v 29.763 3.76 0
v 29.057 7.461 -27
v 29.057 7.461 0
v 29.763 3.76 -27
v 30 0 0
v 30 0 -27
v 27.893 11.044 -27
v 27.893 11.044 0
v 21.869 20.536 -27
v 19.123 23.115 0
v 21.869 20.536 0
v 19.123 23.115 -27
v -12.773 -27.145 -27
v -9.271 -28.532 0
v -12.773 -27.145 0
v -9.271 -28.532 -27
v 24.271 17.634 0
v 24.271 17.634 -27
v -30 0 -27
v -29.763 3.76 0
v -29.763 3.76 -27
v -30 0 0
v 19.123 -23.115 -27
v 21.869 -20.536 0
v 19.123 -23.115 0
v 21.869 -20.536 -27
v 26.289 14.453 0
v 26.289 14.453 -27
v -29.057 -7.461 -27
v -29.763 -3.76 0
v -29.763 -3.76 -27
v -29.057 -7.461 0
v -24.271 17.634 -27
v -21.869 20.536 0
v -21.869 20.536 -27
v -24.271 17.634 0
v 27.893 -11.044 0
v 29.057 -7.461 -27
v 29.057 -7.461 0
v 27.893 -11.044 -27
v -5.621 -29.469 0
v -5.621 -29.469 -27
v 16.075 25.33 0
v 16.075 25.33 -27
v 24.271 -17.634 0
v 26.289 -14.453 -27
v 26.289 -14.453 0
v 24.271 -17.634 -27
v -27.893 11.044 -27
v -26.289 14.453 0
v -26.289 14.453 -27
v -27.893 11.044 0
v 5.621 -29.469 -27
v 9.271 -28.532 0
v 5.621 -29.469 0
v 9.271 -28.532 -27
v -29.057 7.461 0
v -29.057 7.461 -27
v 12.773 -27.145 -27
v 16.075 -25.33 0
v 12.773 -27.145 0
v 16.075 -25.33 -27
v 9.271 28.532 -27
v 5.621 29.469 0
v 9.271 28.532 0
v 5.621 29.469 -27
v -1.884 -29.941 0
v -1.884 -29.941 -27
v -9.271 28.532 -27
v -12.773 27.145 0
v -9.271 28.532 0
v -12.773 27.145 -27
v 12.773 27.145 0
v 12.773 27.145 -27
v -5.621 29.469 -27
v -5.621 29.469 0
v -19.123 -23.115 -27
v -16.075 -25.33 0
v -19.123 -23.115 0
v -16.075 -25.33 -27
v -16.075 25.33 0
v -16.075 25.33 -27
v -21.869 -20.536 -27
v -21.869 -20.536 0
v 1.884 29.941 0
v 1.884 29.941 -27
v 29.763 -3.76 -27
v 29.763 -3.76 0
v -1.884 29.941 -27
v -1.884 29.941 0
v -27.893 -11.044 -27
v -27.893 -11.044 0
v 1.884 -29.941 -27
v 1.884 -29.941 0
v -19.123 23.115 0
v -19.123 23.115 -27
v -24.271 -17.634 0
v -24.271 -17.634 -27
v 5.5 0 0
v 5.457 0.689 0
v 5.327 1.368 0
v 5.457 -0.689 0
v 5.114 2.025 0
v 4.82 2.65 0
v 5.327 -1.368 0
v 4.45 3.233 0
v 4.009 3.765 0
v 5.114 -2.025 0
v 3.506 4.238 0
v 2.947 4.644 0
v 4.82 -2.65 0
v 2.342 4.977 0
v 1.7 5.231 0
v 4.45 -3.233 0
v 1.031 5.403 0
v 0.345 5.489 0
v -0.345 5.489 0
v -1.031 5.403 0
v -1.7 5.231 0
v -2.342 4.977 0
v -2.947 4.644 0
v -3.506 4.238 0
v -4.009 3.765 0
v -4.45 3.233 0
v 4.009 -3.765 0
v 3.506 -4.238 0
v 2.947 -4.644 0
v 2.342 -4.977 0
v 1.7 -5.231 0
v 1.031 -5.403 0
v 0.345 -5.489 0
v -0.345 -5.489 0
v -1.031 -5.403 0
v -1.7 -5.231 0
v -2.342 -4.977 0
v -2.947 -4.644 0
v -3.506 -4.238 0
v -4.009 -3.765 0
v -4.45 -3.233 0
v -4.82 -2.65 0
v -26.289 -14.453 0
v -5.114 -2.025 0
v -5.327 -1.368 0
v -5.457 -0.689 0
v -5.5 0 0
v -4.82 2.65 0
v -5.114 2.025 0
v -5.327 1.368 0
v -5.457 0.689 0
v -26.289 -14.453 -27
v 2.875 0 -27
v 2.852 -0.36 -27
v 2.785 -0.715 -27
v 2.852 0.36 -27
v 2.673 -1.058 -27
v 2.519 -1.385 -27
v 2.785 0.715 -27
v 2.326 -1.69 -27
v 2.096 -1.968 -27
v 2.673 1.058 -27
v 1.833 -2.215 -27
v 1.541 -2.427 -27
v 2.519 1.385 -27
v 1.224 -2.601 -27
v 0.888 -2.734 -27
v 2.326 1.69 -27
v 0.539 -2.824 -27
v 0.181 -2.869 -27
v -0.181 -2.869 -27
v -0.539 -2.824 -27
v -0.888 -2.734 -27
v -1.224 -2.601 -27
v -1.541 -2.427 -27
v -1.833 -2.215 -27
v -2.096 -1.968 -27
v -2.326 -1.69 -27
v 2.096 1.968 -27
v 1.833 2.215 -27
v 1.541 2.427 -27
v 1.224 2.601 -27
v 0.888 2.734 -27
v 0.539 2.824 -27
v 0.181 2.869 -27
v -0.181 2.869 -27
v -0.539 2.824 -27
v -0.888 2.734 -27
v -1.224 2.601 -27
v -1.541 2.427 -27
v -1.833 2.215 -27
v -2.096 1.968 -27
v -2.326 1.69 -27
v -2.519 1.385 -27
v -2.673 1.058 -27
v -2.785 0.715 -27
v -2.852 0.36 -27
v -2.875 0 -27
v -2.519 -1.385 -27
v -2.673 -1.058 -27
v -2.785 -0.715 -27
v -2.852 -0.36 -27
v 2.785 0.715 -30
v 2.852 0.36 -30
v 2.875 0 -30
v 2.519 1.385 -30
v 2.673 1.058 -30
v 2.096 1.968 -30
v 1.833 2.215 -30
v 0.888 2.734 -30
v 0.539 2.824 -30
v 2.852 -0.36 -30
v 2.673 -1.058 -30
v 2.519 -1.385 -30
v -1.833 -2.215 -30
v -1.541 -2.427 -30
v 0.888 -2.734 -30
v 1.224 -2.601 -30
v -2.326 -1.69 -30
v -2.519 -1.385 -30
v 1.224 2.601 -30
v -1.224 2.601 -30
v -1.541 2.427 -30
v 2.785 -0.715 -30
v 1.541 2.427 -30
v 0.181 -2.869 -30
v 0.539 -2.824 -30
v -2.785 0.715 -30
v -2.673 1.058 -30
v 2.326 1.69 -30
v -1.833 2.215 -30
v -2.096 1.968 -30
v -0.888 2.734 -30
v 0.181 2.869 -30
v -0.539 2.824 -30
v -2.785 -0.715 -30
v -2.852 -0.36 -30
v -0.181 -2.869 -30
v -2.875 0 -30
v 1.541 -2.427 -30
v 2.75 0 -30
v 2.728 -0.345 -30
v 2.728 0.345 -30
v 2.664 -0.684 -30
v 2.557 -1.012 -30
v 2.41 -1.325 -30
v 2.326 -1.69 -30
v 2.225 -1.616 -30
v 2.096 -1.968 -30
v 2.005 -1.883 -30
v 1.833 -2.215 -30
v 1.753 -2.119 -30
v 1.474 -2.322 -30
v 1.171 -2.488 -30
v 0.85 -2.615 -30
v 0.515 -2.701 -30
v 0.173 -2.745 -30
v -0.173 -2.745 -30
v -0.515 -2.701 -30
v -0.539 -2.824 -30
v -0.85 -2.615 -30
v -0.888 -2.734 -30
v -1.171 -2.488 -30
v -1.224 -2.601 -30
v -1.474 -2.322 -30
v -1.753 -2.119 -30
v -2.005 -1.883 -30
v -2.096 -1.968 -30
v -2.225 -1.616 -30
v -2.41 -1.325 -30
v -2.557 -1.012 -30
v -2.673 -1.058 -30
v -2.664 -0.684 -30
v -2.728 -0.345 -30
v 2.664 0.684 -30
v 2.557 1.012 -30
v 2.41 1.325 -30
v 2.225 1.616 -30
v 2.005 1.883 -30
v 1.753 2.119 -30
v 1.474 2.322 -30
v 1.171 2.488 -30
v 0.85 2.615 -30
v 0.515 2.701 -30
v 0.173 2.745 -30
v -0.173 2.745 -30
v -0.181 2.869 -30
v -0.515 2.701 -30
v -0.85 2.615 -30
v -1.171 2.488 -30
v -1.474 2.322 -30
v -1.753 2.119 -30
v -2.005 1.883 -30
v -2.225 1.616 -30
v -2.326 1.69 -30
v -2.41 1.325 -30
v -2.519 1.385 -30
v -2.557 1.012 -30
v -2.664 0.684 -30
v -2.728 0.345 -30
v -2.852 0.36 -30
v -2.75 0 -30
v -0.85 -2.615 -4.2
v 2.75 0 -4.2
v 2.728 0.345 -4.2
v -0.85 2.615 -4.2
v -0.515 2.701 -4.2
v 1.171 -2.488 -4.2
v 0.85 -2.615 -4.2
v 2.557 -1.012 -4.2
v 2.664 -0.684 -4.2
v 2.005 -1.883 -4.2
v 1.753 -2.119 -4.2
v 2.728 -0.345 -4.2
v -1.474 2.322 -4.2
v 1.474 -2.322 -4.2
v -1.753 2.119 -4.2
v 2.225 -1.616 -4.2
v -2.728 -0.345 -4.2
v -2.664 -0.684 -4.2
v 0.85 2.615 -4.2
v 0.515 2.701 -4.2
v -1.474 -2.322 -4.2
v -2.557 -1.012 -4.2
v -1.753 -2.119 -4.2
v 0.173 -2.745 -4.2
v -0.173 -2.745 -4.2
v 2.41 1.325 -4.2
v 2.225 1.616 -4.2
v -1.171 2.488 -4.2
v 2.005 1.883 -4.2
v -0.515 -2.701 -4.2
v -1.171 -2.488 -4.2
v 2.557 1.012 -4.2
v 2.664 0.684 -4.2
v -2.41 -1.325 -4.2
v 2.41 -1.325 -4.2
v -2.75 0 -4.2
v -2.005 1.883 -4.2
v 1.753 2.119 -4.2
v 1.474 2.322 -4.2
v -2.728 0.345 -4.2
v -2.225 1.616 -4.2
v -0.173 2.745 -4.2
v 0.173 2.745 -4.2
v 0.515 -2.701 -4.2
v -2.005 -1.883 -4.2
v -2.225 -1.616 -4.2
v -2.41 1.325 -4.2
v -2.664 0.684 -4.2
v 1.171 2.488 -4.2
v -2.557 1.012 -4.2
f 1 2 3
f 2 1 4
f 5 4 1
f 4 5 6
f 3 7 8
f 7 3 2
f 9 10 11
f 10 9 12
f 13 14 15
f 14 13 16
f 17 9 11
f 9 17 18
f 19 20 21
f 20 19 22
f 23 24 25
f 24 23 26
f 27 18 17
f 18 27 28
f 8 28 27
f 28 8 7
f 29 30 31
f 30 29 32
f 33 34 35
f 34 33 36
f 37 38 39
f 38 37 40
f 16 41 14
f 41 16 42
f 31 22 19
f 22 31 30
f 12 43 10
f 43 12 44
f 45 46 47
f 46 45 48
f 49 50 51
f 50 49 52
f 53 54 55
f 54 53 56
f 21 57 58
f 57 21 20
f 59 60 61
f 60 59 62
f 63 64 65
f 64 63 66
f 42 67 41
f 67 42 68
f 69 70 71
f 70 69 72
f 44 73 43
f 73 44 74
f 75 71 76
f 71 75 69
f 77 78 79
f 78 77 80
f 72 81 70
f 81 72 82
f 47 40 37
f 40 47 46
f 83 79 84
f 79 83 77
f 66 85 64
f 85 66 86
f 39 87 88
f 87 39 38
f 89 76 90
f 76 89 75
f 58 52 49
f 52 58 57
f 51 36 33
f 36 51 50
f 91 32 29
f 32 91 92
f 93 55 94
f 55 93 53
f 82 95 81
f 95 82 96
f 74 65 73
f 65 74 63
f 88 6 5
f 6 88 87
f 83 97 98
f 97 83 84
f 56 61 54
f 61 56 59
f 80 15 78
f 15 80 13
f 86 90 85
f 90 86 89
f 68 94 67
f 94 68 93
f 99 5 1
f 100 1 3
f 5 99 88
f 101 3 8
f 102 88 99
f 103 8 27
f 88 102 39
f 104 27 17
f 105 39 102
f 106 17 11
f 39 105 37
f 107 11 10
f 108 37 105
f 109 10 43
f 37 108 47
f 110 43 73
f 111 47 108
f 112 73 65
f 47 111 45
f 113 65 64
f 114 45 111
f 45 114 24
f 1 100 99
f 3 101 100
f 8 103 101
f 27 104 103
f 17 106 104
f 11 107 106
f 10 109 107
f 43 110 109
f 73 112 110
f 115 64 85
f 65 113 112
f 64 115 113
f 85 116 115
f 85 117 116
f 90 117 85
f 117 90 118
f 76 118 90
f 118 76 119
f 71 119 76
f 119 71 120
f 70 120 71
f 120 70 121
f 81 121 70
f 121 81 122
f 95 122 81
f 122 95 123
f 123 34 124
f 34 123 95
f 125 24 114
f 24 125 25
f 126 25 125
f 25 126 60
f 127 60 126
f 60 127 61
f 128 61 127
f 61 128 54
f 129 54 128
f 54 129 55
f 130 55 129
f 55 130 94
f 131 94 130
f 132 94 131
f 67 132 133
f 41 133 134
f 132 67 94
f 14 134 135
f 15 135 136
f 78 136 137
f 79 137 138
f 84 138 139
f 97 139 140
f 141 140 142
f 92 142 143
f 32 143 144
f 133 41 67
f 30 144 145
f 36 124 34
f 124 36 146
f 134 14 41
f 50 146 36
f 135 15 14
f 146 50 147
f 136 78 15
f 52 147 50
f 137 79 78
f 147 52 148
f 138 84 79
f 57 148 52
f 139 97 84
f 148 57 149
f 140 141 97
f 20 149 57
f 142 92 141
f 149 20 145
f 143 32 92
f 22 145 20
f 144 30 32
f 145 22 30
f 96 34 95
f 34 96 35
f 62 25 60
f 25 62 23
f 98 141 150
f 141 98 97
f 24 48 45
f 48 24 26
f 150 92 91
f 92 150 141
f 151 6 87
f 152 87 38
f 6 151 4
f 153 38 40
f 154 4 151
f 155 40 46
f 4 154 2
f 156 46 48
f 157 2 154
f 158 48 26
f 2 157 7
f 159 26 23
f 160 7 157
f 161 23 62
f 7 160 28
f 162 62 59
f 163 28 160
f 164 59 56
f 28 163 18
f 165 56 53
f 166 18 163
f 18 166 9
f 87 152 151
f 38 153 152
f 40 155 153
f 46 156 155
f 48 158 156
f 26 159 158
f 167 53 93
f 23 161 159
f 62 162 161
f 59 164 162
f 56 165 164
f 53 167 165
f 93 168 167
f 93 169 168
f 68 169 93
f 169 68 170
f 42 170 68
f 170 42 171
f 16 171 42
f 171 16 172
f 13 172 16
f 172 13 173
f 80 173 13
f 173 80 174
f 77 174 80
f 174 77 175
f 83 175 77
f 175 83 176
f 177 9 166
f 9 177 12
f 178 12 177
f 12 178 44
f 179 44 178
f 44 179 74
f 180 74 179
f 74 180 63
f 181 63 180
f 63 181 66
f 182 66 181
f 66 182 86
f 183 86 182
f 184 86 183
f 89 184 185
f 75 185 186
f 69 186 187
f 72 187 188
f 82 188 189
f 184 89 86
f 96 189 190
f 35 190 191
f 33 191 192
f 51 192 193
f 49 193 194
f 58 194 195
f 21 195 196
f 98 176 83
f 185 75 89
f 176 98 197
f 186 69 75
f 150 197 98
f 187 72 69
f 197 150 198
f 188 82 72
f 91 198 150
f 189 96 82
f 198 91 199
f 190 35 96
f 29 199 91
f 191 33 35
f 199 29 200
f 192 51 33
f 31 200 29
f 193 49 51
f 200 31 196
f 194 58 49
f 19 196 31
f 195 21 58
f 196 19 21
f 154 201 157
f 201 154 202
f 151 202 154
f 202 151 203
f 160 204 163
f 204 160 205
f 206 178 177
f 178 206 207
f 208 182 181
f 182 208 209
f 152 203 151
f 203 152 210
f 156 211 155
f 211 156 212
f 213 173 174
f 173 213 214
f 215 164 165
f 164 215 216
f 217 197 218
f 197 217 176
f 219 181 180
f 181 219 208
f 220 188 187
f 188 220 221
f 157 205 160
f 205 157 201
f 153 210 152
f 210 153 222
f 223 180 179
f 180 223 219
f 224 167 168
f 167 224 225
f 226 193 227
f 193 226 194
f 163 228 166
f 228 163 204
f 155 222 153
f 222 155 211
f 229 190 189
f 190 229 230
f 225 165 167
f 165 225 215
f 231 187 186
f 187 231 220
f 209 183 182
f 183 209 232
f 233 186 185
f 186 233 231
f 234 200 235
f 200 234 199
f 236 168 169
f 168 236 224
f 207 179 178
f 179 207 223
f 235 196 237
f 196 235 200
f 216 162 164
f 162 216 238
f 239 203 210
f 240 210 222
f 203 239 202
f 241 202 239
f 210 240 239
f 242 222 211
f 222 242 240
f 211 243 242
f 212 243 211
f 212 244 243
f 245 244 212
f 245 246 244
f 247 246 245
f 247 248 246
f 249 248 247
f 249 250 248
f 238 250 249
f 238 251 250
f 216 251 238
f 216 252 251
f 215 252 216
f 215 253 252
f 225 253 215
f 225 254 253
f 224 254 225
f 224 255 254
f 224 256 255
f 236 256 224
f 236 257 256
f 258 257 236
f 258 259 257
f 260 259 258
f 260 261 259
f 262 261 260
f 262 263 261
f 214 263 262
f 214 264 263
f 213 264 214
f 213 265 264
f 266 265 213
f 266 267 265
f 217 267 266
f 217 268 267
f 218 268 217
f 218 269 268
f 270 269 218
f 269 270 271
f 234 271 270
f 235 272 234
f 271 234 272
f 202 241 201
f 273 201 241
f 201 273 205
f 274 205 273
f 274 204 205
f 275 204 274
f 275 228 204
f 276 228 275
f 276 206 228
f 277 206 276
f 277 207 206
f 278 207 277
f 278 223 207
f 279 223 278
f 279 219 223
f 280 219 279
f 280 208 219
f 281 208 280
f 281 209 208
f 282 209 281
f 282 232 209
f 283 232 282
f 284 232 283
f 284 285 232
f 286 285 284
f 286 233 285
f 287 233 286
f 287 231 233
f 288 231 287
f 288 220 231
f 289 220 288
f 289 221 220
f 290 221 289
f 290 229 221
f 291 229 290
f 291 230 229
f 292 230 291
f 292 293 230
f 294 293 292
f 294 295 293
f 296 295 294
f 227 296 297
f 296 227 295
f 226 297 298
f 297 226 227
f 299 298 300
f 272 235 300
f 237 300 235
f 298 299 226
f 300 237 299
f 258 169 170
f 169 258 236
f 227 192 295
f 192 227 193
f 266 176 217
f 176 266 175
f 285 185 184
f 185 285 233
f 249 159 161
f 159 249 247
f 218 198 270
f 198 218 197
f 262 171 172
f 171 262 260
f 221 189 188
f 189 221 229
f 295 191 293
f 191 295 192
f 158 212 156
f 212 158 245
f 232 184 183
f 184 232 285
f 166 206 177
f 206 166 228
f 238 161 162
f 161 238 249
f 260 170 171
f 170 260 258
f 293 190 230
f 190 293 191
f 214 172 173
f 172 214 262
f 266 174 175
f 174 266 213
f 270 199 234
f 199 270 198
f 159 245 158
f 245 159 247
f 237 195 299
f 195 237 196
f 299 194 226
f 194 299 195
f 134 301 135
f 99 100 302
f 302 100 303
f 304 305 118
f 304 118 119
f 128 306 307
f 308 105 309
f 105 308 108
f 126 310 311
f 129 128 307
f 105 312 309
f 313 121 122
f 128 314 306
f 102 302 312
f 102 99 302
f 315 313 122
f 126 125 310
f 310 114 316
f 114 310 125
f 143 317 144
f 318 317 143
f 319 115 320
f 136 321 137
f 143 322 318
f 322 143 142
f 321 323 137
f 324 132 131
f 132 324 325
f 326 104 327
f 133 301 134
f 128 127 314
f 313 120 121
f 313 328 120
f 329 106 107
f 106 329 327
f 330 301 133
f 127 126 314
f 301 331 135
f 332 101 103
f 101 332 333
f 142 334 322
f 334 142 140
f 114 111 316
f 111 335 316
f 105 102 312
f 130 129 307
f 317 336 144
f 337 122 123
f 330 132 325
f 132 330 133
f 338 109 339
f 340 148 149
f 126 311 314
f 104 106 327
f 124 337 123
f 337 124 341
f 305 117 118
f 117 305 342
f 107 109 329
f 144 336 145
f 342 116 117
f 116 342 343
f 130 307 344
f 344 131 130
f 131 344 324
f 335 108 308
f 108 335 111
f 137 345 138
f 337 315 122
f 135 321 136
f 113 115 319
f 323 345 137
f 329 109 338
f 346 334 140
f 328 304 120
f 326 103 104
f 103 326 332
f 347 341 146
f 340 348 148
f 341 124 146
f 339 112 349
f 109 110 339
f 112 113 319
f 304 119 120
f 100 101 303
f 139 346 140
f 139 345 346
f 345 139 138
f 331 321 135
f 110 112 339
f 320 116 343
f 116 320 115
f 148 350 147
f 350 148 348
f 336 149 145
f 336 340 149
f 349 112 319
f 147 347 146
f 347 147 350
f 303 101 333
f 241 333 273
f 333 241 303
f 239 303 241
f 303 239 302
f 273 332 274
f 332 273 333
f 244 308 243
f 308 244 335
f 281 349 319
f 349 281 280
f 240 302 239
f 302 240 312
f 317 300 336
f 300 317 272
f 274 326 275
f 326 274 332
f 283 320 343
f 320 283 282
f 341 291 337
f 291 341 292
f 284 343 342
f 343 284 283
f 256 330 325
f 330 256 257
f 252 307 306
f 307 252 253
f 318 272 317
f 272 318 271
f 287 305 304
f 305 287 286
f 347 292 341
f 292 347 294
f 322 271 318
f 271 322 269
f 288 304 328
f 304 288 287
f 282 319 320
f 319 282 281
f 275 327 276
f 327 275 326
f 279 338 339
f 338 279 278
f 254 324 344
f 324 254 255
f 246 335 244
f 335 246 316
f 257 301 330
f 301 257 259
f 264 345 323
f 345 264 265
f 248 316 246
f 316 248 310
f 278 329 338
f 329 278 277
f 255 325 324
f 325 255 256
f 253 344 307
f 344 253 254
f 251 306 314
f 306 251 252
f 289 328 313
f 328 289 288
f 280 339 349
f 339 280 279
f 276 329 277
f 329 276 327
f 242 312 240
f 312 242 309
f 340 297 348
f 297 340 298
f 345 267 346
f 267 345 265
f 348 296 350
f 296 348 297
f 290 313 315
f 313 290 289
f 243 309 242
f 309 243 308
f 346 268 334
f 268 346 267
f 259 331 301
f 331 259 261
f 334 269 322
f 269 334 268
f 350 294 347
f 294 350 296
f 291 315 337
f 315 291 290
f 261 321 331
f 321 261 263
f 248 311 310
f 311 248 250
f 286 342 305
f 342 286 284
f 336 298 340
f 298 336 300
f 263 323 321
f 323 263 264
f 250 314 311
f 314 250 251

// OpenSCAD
$fn = 50;

difference() {
	union() {
		translate(v = [0, 0, -27.0]) {
			cylinder(h = 27, r = 30.0);
		}
		#translate(v = [0, 0, -30.0]) {
			cylinder(h = 30, r = 2.875);
		}
	}
	union() {
		translate(v = [0, 0, 0]) {
			rotate(a = [0, 0, 0]) {
				difference() {
					union() {
						translate(v = [0, 0, -30.0]) {
							cylinder(h = 30, r = 2.25);
						}
						translate(v = [0, 0, -4.2]) {
							cylinder(h = 4.2, r1 = 2.75, r2 = 5.5);
						}
						translate(v = [0, 0, -30.0]) {
							cylinder(h = 30, r = 2.75);
						}
						translate(v = [0, 0, -30.0]) {
							cylinder(h = 30, r = 2.25);
						}
					}
					union();
				}
			}
		}
	}
}
